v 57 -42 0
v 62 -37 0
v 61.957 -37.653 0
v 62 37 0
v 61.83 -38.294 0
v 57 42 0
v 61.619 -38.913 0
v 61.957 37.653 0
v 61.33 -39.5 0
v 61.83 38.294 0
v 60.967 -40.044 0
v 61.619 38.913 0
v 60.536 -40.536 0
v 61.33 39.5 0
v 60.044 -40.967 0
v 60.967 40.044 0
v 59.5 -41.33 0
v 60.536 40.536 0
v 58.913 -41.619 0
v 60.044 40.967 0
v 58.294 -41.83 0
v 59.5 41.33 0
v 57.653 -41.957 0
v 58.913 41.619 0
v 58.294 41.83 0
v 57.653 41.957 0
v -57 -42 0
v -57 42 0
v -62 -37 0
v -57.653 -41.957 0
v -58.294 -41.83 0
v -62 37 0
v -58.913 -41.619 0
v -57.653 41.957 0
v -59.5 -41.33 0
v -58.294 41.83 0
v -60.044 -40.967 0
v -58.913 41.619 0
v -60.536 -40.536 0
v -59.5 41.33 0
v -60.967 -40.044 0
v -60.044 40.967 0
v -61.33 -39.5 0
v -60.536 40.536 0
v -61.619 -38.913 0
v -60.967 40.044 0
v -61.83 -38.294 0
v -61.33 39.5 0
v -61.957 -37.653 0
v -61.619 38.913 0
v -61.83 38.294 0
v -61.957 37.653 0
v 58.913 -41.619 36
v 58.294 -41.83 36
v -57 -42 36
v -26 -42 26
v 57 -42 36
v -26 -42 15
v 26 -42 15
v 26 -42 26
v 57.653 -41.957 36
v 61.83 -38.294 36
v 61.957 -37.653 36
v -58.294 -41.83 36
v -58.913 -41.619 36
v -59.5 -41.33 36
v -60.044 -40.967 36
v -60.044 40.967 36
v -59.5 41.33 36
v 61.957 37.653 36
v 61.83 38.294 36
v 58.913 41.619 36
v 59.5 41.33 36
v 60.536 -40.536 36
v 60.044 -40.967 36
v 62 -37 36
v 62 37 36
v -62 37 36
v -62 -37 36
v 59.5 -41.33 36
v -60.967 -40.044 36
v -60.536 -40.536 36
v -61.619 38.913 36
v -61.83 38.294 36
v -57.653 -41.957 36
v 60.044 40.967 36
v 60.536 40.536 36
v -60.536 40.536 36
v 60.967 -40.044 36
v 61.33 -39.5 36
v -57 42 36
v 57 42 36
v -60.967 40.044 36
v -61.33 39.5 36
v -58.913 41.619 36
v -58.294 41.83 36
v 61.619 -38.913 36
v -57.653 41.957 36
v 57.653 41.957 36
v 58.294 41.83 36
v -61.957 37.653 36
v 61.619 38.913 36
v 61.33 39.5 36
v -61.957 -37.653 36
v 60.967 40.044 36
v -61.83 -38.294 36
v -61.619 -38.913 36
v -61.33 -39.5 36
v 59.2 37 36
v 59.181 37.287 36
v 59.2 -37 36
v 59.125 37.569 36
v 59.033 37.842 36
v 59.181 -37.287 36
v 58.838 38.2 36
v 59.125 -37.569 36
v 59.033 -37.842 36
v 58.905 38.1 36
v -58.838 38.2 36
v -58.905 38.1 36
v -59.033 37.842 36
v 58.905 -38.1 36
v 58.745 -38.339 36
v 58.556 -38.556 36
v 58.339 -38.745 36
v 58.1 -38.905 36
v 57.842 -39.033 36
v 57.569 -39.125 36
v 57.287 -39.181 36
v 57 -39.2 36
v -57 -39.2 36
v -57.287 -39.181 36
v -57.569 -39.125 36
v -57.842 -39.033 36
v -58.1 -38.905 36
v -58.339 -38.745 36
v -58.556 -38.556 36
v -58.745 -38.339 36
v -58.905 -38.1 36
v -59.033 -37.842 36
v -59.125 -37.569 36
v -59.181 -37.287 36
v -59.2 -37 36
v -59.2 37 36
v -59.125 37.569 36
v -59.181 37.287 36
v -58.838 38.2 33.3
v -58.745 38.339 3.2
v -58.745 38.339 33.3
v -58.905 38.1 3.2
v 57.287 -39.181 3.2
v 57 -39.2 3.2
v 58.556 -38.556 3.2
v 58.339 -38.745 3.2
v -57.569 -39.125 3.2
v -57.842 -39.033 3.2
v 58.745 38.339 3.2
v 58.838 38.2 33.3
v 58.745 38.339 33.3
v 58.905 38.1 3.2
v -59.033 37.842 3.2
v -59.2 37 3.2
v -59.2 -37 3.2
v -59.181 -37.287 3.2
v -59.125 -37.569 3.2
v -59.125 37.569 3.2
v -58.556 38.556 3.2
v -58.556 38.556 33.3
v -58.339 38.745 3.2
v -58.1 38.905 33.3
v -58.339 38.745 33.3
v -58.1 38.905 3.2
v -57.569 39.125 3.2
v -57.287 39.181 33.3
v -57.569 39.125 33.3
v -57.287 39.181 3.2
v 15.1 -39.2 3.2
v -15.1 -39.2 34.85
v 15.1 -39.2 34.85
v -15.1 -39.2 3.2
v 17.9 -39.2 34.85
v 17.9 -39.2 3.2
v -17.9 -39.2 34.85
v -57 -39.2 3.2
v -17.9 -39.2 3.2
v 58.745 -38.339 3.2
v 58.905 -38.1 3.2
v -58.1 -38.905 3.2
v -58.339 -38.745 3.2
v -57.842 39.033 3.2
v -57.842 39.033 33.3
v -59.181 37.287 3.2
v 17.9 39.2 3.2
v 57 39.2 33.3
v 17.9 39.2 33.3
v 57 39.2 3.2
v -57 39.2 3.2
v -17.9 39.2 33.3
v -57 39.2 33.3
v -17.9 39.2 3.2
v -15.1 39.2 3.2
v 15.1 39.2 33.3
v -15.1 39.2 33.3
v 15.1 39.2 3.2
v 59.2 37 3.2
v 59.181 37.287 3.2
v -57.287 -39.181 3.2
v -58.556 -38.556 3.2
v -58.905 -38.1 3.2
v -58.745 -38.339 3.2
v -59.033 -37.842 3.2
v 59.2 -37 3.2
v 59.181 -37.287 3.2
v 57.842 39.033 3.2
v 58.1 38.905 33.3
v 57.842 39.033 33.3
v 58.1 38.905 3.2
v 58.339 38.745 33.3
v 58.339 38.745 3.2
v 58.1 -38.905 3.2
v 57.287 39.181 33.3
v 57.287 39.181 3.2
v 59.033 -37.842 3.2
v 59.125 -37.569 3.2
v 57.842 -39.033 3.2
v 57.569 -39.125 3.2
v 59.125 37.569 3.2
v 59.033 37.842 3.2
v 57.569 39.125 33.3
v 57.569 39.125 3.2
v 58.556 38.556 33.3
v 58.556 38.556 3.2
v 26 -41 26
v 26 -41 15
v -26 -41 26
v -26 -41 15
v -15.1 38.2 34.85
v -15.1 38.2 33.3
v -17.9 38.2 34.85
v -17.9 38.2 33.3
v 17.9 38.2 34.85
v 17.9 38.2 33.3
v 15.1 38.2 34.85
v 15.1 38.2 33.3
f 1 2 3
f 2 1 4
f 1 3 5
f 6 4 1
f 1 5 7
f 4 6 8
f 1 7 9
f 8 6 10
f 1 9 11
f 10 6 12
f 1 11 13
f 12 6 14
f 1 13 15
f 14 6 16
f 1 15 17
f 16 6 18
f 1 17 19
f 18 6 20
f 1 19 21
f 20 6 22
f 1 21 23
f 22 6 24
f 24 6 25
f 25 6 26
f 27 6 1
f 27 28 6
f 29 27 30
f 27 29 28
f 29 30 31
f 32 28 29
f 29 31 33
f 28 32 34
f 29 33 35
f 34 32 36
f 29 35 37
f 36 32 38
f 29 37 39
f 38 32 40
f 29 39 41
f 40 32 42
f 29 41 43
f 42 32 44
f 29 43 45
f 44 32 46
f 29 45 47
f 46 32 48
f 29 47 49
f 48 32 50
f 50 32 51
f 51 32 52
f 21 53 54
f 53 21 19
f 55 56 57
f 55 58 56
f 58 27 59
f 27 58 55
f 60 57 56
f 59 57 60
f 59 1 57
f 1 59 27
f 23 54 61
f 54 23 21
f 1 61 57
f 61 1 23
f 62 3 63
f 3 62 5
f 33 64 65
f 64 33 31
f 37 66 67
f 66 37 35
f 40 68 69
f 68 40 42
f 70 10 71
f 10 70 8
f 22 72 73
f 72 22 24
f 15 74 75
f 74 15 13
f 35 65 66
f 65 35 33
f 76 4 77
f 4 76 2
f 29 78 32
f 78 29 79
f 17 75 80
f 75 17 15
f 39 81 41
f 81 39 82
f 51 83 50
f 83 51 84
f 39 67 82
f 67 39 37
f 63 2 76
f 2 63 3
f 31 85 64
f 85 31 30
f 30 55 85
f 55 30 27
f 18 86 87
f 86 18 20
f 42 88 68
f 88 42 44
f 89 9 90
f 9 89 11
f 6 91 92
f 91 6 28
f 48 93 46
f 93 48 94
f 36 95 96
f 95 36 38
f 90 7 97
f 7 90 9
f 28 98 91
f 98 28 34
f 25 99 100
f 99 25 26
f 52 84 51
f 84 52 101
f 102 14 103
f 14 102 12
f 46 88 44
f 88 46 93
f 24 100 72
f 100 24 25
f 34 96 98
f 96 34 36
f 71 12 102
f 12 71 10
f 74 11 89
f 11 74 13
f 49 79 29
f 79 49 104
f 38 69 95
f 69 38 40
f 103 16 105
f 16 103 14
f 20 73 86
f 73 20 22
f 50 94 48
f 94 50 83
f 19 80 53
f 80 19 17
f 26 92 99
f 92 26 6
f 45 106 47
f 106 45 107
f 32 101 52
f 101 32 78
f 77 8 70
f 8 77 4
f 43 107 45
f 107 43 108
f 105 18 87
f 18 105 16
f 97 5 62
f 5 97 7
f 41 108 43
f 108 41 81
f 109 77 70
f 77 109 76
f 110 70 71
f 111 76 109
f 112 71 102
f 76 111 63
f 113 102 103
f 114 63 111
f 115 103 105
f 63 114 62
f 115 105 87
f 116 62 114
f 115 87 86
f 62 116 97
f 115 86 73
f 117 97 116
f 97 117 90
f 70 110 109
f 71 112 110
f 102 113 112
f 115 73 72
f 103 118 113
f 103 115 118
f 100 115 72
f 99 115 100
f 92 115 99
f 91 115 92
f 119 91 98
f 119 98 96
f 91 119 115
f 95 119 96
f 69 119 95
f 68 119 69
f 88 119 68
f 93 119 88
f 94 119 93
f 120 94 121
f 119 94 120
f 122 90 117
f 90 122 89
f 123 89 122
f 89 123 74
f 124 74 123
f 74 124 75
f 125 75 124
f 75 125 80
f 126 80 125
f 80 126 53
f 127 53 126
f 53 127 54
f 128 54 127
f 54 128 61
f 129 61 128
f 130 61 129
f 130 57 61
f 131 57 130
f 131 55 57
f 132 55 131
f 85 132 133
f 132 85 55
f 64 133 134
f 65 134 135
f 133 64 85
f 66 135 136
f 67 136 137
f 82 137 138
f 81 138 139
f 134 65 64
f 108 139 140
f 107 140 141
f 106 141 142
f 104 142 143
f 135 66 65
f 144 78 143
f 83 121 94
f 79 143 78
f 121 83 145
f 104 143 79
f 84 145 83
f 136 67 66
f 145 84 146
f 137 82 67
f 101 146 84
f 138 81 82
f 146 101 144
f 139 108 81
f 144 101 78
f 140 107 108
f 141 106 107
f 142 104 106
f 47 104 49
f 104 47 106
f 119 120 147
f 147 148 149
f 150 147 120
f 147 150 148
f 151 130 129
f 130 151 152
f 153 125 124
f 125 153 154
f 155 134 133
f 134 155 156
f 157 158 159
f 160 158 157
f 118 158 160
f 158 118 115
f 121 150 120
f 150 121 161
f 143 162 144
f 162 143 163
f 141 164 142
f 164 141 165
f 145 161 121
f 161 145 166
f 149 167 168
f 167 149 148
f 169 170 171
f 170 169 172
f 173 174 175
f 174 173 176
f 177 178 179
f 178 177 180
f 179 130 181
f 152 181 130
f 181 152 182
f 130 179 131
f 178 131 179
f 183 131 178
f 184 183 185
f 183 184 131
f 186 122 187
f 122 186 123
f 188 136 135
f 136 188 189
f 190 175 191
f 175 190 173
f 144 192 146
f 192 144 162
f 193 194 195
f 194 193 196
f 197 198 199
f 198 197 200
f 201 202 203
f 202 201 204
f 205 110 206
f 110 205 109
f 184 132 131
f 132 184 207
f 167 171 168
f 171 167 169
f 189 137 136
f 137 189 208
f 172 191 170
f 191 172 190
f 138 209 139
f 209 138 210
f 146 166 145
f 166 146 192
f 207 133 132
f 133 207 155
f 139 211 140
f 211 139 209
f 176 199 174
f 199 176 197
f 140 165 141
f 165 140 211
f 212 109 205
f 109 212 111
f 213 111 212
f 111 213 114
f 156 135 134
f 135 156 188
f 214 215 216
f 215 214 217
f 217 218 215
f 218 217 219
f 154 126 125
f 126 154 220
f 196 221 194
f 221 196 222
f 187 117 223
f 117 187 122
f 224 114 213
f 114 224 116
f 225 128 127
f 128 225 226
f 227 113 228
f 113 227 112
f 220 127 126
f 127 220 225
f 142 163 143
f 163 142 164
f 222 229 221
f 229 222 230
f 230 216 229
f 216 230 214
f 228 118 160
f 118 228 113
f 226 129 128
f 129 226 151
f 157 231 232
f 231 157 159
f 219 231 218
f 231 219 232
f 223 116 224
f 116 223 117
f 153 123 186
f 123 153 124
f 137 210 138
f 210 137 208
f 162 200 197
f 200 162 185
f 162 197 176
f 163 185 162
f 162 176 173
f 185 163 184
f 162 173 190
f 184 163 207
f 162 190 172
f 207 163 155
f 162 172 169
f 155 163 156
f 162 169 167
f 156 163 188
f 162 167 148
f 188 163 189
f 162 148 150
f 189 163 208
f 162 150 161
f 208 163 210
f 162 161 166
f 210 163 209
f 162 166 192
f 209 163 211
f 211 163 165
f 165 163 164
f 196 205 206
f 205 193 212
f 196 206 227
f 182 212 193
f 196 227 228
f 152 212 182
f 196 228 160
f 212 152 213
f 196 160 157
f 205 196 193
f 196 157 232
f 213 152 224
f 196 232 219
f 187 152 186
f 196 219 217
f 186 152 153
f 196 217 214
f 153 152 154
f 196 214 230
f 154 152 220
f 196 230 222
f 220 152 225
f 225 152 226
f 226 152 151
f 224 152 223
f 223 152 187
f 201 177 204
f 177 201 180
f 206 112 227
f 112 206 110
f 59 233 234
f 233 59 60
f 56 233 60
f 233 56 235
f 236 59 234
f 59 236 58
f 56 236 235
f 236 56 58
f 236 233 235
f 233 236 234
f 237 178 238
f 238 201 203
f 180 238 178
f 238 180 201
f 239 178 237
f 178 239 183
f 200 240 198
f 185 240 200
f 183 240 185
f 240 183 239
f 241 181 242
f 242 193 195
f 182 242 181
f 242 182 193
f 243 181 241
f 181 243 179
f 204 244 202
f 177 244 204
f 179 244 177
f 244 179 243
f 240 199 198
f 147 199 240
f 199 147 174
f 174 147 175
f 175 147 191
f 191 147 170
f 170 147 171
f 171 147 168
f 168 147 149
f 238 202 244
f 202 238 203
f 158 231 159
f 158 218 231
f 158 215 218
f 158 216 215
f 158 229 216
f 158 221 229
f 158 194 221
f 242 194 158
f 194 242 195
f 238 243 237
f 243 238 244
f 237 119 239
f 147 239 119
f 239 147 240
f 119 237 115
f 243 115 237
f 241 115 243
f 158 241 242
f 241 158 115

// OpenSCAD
// SPDX-License-Identifier: MIT
// Label-front parts bin — original modular open bin, mm/Z-up.
// CAD prototype ONLY. No assumed compatibility with brand-specific grids.
$fn=48;
outer_width=124;
outer_depth=84;
outer_height=36;
outer_radius=5;
wall=2.8;
floor_thickness=3.2;
divider_count=2;
divider_spacing=33;

assert(wall >= 2.4 && floor_thickness >= 2.4);
assert(outer_width > 3*divider_spacing && outer_height > floor_thickness+12);

module round_prism(width, depth, height, radius) {
  linear_extrude(height=height)
    offset(r=radius)
      square([width-2*radius, depth-2*radius], center=true);
}

union() {
  difference() {
    round_prism(outer_width, outer_depth, outer_height, outer_radius);
    translate([0,0,floor_thickness])
      round_prism(outer_width-2*wall, outer_depth-2*wall,
                   outer_height, max(1,outer_radius-wall));
    // Recess on the front, but preserve 1.5+ mm of front-facing shell.
    translate([-26,-outer_depth/2-.1,15])
      cube([52,1.1,11]);
  }
  // Dividers overlap inner perimeter and bottom to form ONE connected solid.
  for (ix=[-1,1])
    translate([ix*divider_spacing/2-wall/2, -outer_depth/2+wall-.25,
               floor_thickness-.35])
      cube([wall,outer_depth-2*wall+.5,outer_height-floor_thickness-.8]);
  // Raised exterior shelf-stop along the rear (inside the footprint).
  translate([-outer_width/2+wall, outer_depth/2-wall-1, outer_height-2.7])
    cube([outer_width-2*wall, 1.5, 2.7]);
}
